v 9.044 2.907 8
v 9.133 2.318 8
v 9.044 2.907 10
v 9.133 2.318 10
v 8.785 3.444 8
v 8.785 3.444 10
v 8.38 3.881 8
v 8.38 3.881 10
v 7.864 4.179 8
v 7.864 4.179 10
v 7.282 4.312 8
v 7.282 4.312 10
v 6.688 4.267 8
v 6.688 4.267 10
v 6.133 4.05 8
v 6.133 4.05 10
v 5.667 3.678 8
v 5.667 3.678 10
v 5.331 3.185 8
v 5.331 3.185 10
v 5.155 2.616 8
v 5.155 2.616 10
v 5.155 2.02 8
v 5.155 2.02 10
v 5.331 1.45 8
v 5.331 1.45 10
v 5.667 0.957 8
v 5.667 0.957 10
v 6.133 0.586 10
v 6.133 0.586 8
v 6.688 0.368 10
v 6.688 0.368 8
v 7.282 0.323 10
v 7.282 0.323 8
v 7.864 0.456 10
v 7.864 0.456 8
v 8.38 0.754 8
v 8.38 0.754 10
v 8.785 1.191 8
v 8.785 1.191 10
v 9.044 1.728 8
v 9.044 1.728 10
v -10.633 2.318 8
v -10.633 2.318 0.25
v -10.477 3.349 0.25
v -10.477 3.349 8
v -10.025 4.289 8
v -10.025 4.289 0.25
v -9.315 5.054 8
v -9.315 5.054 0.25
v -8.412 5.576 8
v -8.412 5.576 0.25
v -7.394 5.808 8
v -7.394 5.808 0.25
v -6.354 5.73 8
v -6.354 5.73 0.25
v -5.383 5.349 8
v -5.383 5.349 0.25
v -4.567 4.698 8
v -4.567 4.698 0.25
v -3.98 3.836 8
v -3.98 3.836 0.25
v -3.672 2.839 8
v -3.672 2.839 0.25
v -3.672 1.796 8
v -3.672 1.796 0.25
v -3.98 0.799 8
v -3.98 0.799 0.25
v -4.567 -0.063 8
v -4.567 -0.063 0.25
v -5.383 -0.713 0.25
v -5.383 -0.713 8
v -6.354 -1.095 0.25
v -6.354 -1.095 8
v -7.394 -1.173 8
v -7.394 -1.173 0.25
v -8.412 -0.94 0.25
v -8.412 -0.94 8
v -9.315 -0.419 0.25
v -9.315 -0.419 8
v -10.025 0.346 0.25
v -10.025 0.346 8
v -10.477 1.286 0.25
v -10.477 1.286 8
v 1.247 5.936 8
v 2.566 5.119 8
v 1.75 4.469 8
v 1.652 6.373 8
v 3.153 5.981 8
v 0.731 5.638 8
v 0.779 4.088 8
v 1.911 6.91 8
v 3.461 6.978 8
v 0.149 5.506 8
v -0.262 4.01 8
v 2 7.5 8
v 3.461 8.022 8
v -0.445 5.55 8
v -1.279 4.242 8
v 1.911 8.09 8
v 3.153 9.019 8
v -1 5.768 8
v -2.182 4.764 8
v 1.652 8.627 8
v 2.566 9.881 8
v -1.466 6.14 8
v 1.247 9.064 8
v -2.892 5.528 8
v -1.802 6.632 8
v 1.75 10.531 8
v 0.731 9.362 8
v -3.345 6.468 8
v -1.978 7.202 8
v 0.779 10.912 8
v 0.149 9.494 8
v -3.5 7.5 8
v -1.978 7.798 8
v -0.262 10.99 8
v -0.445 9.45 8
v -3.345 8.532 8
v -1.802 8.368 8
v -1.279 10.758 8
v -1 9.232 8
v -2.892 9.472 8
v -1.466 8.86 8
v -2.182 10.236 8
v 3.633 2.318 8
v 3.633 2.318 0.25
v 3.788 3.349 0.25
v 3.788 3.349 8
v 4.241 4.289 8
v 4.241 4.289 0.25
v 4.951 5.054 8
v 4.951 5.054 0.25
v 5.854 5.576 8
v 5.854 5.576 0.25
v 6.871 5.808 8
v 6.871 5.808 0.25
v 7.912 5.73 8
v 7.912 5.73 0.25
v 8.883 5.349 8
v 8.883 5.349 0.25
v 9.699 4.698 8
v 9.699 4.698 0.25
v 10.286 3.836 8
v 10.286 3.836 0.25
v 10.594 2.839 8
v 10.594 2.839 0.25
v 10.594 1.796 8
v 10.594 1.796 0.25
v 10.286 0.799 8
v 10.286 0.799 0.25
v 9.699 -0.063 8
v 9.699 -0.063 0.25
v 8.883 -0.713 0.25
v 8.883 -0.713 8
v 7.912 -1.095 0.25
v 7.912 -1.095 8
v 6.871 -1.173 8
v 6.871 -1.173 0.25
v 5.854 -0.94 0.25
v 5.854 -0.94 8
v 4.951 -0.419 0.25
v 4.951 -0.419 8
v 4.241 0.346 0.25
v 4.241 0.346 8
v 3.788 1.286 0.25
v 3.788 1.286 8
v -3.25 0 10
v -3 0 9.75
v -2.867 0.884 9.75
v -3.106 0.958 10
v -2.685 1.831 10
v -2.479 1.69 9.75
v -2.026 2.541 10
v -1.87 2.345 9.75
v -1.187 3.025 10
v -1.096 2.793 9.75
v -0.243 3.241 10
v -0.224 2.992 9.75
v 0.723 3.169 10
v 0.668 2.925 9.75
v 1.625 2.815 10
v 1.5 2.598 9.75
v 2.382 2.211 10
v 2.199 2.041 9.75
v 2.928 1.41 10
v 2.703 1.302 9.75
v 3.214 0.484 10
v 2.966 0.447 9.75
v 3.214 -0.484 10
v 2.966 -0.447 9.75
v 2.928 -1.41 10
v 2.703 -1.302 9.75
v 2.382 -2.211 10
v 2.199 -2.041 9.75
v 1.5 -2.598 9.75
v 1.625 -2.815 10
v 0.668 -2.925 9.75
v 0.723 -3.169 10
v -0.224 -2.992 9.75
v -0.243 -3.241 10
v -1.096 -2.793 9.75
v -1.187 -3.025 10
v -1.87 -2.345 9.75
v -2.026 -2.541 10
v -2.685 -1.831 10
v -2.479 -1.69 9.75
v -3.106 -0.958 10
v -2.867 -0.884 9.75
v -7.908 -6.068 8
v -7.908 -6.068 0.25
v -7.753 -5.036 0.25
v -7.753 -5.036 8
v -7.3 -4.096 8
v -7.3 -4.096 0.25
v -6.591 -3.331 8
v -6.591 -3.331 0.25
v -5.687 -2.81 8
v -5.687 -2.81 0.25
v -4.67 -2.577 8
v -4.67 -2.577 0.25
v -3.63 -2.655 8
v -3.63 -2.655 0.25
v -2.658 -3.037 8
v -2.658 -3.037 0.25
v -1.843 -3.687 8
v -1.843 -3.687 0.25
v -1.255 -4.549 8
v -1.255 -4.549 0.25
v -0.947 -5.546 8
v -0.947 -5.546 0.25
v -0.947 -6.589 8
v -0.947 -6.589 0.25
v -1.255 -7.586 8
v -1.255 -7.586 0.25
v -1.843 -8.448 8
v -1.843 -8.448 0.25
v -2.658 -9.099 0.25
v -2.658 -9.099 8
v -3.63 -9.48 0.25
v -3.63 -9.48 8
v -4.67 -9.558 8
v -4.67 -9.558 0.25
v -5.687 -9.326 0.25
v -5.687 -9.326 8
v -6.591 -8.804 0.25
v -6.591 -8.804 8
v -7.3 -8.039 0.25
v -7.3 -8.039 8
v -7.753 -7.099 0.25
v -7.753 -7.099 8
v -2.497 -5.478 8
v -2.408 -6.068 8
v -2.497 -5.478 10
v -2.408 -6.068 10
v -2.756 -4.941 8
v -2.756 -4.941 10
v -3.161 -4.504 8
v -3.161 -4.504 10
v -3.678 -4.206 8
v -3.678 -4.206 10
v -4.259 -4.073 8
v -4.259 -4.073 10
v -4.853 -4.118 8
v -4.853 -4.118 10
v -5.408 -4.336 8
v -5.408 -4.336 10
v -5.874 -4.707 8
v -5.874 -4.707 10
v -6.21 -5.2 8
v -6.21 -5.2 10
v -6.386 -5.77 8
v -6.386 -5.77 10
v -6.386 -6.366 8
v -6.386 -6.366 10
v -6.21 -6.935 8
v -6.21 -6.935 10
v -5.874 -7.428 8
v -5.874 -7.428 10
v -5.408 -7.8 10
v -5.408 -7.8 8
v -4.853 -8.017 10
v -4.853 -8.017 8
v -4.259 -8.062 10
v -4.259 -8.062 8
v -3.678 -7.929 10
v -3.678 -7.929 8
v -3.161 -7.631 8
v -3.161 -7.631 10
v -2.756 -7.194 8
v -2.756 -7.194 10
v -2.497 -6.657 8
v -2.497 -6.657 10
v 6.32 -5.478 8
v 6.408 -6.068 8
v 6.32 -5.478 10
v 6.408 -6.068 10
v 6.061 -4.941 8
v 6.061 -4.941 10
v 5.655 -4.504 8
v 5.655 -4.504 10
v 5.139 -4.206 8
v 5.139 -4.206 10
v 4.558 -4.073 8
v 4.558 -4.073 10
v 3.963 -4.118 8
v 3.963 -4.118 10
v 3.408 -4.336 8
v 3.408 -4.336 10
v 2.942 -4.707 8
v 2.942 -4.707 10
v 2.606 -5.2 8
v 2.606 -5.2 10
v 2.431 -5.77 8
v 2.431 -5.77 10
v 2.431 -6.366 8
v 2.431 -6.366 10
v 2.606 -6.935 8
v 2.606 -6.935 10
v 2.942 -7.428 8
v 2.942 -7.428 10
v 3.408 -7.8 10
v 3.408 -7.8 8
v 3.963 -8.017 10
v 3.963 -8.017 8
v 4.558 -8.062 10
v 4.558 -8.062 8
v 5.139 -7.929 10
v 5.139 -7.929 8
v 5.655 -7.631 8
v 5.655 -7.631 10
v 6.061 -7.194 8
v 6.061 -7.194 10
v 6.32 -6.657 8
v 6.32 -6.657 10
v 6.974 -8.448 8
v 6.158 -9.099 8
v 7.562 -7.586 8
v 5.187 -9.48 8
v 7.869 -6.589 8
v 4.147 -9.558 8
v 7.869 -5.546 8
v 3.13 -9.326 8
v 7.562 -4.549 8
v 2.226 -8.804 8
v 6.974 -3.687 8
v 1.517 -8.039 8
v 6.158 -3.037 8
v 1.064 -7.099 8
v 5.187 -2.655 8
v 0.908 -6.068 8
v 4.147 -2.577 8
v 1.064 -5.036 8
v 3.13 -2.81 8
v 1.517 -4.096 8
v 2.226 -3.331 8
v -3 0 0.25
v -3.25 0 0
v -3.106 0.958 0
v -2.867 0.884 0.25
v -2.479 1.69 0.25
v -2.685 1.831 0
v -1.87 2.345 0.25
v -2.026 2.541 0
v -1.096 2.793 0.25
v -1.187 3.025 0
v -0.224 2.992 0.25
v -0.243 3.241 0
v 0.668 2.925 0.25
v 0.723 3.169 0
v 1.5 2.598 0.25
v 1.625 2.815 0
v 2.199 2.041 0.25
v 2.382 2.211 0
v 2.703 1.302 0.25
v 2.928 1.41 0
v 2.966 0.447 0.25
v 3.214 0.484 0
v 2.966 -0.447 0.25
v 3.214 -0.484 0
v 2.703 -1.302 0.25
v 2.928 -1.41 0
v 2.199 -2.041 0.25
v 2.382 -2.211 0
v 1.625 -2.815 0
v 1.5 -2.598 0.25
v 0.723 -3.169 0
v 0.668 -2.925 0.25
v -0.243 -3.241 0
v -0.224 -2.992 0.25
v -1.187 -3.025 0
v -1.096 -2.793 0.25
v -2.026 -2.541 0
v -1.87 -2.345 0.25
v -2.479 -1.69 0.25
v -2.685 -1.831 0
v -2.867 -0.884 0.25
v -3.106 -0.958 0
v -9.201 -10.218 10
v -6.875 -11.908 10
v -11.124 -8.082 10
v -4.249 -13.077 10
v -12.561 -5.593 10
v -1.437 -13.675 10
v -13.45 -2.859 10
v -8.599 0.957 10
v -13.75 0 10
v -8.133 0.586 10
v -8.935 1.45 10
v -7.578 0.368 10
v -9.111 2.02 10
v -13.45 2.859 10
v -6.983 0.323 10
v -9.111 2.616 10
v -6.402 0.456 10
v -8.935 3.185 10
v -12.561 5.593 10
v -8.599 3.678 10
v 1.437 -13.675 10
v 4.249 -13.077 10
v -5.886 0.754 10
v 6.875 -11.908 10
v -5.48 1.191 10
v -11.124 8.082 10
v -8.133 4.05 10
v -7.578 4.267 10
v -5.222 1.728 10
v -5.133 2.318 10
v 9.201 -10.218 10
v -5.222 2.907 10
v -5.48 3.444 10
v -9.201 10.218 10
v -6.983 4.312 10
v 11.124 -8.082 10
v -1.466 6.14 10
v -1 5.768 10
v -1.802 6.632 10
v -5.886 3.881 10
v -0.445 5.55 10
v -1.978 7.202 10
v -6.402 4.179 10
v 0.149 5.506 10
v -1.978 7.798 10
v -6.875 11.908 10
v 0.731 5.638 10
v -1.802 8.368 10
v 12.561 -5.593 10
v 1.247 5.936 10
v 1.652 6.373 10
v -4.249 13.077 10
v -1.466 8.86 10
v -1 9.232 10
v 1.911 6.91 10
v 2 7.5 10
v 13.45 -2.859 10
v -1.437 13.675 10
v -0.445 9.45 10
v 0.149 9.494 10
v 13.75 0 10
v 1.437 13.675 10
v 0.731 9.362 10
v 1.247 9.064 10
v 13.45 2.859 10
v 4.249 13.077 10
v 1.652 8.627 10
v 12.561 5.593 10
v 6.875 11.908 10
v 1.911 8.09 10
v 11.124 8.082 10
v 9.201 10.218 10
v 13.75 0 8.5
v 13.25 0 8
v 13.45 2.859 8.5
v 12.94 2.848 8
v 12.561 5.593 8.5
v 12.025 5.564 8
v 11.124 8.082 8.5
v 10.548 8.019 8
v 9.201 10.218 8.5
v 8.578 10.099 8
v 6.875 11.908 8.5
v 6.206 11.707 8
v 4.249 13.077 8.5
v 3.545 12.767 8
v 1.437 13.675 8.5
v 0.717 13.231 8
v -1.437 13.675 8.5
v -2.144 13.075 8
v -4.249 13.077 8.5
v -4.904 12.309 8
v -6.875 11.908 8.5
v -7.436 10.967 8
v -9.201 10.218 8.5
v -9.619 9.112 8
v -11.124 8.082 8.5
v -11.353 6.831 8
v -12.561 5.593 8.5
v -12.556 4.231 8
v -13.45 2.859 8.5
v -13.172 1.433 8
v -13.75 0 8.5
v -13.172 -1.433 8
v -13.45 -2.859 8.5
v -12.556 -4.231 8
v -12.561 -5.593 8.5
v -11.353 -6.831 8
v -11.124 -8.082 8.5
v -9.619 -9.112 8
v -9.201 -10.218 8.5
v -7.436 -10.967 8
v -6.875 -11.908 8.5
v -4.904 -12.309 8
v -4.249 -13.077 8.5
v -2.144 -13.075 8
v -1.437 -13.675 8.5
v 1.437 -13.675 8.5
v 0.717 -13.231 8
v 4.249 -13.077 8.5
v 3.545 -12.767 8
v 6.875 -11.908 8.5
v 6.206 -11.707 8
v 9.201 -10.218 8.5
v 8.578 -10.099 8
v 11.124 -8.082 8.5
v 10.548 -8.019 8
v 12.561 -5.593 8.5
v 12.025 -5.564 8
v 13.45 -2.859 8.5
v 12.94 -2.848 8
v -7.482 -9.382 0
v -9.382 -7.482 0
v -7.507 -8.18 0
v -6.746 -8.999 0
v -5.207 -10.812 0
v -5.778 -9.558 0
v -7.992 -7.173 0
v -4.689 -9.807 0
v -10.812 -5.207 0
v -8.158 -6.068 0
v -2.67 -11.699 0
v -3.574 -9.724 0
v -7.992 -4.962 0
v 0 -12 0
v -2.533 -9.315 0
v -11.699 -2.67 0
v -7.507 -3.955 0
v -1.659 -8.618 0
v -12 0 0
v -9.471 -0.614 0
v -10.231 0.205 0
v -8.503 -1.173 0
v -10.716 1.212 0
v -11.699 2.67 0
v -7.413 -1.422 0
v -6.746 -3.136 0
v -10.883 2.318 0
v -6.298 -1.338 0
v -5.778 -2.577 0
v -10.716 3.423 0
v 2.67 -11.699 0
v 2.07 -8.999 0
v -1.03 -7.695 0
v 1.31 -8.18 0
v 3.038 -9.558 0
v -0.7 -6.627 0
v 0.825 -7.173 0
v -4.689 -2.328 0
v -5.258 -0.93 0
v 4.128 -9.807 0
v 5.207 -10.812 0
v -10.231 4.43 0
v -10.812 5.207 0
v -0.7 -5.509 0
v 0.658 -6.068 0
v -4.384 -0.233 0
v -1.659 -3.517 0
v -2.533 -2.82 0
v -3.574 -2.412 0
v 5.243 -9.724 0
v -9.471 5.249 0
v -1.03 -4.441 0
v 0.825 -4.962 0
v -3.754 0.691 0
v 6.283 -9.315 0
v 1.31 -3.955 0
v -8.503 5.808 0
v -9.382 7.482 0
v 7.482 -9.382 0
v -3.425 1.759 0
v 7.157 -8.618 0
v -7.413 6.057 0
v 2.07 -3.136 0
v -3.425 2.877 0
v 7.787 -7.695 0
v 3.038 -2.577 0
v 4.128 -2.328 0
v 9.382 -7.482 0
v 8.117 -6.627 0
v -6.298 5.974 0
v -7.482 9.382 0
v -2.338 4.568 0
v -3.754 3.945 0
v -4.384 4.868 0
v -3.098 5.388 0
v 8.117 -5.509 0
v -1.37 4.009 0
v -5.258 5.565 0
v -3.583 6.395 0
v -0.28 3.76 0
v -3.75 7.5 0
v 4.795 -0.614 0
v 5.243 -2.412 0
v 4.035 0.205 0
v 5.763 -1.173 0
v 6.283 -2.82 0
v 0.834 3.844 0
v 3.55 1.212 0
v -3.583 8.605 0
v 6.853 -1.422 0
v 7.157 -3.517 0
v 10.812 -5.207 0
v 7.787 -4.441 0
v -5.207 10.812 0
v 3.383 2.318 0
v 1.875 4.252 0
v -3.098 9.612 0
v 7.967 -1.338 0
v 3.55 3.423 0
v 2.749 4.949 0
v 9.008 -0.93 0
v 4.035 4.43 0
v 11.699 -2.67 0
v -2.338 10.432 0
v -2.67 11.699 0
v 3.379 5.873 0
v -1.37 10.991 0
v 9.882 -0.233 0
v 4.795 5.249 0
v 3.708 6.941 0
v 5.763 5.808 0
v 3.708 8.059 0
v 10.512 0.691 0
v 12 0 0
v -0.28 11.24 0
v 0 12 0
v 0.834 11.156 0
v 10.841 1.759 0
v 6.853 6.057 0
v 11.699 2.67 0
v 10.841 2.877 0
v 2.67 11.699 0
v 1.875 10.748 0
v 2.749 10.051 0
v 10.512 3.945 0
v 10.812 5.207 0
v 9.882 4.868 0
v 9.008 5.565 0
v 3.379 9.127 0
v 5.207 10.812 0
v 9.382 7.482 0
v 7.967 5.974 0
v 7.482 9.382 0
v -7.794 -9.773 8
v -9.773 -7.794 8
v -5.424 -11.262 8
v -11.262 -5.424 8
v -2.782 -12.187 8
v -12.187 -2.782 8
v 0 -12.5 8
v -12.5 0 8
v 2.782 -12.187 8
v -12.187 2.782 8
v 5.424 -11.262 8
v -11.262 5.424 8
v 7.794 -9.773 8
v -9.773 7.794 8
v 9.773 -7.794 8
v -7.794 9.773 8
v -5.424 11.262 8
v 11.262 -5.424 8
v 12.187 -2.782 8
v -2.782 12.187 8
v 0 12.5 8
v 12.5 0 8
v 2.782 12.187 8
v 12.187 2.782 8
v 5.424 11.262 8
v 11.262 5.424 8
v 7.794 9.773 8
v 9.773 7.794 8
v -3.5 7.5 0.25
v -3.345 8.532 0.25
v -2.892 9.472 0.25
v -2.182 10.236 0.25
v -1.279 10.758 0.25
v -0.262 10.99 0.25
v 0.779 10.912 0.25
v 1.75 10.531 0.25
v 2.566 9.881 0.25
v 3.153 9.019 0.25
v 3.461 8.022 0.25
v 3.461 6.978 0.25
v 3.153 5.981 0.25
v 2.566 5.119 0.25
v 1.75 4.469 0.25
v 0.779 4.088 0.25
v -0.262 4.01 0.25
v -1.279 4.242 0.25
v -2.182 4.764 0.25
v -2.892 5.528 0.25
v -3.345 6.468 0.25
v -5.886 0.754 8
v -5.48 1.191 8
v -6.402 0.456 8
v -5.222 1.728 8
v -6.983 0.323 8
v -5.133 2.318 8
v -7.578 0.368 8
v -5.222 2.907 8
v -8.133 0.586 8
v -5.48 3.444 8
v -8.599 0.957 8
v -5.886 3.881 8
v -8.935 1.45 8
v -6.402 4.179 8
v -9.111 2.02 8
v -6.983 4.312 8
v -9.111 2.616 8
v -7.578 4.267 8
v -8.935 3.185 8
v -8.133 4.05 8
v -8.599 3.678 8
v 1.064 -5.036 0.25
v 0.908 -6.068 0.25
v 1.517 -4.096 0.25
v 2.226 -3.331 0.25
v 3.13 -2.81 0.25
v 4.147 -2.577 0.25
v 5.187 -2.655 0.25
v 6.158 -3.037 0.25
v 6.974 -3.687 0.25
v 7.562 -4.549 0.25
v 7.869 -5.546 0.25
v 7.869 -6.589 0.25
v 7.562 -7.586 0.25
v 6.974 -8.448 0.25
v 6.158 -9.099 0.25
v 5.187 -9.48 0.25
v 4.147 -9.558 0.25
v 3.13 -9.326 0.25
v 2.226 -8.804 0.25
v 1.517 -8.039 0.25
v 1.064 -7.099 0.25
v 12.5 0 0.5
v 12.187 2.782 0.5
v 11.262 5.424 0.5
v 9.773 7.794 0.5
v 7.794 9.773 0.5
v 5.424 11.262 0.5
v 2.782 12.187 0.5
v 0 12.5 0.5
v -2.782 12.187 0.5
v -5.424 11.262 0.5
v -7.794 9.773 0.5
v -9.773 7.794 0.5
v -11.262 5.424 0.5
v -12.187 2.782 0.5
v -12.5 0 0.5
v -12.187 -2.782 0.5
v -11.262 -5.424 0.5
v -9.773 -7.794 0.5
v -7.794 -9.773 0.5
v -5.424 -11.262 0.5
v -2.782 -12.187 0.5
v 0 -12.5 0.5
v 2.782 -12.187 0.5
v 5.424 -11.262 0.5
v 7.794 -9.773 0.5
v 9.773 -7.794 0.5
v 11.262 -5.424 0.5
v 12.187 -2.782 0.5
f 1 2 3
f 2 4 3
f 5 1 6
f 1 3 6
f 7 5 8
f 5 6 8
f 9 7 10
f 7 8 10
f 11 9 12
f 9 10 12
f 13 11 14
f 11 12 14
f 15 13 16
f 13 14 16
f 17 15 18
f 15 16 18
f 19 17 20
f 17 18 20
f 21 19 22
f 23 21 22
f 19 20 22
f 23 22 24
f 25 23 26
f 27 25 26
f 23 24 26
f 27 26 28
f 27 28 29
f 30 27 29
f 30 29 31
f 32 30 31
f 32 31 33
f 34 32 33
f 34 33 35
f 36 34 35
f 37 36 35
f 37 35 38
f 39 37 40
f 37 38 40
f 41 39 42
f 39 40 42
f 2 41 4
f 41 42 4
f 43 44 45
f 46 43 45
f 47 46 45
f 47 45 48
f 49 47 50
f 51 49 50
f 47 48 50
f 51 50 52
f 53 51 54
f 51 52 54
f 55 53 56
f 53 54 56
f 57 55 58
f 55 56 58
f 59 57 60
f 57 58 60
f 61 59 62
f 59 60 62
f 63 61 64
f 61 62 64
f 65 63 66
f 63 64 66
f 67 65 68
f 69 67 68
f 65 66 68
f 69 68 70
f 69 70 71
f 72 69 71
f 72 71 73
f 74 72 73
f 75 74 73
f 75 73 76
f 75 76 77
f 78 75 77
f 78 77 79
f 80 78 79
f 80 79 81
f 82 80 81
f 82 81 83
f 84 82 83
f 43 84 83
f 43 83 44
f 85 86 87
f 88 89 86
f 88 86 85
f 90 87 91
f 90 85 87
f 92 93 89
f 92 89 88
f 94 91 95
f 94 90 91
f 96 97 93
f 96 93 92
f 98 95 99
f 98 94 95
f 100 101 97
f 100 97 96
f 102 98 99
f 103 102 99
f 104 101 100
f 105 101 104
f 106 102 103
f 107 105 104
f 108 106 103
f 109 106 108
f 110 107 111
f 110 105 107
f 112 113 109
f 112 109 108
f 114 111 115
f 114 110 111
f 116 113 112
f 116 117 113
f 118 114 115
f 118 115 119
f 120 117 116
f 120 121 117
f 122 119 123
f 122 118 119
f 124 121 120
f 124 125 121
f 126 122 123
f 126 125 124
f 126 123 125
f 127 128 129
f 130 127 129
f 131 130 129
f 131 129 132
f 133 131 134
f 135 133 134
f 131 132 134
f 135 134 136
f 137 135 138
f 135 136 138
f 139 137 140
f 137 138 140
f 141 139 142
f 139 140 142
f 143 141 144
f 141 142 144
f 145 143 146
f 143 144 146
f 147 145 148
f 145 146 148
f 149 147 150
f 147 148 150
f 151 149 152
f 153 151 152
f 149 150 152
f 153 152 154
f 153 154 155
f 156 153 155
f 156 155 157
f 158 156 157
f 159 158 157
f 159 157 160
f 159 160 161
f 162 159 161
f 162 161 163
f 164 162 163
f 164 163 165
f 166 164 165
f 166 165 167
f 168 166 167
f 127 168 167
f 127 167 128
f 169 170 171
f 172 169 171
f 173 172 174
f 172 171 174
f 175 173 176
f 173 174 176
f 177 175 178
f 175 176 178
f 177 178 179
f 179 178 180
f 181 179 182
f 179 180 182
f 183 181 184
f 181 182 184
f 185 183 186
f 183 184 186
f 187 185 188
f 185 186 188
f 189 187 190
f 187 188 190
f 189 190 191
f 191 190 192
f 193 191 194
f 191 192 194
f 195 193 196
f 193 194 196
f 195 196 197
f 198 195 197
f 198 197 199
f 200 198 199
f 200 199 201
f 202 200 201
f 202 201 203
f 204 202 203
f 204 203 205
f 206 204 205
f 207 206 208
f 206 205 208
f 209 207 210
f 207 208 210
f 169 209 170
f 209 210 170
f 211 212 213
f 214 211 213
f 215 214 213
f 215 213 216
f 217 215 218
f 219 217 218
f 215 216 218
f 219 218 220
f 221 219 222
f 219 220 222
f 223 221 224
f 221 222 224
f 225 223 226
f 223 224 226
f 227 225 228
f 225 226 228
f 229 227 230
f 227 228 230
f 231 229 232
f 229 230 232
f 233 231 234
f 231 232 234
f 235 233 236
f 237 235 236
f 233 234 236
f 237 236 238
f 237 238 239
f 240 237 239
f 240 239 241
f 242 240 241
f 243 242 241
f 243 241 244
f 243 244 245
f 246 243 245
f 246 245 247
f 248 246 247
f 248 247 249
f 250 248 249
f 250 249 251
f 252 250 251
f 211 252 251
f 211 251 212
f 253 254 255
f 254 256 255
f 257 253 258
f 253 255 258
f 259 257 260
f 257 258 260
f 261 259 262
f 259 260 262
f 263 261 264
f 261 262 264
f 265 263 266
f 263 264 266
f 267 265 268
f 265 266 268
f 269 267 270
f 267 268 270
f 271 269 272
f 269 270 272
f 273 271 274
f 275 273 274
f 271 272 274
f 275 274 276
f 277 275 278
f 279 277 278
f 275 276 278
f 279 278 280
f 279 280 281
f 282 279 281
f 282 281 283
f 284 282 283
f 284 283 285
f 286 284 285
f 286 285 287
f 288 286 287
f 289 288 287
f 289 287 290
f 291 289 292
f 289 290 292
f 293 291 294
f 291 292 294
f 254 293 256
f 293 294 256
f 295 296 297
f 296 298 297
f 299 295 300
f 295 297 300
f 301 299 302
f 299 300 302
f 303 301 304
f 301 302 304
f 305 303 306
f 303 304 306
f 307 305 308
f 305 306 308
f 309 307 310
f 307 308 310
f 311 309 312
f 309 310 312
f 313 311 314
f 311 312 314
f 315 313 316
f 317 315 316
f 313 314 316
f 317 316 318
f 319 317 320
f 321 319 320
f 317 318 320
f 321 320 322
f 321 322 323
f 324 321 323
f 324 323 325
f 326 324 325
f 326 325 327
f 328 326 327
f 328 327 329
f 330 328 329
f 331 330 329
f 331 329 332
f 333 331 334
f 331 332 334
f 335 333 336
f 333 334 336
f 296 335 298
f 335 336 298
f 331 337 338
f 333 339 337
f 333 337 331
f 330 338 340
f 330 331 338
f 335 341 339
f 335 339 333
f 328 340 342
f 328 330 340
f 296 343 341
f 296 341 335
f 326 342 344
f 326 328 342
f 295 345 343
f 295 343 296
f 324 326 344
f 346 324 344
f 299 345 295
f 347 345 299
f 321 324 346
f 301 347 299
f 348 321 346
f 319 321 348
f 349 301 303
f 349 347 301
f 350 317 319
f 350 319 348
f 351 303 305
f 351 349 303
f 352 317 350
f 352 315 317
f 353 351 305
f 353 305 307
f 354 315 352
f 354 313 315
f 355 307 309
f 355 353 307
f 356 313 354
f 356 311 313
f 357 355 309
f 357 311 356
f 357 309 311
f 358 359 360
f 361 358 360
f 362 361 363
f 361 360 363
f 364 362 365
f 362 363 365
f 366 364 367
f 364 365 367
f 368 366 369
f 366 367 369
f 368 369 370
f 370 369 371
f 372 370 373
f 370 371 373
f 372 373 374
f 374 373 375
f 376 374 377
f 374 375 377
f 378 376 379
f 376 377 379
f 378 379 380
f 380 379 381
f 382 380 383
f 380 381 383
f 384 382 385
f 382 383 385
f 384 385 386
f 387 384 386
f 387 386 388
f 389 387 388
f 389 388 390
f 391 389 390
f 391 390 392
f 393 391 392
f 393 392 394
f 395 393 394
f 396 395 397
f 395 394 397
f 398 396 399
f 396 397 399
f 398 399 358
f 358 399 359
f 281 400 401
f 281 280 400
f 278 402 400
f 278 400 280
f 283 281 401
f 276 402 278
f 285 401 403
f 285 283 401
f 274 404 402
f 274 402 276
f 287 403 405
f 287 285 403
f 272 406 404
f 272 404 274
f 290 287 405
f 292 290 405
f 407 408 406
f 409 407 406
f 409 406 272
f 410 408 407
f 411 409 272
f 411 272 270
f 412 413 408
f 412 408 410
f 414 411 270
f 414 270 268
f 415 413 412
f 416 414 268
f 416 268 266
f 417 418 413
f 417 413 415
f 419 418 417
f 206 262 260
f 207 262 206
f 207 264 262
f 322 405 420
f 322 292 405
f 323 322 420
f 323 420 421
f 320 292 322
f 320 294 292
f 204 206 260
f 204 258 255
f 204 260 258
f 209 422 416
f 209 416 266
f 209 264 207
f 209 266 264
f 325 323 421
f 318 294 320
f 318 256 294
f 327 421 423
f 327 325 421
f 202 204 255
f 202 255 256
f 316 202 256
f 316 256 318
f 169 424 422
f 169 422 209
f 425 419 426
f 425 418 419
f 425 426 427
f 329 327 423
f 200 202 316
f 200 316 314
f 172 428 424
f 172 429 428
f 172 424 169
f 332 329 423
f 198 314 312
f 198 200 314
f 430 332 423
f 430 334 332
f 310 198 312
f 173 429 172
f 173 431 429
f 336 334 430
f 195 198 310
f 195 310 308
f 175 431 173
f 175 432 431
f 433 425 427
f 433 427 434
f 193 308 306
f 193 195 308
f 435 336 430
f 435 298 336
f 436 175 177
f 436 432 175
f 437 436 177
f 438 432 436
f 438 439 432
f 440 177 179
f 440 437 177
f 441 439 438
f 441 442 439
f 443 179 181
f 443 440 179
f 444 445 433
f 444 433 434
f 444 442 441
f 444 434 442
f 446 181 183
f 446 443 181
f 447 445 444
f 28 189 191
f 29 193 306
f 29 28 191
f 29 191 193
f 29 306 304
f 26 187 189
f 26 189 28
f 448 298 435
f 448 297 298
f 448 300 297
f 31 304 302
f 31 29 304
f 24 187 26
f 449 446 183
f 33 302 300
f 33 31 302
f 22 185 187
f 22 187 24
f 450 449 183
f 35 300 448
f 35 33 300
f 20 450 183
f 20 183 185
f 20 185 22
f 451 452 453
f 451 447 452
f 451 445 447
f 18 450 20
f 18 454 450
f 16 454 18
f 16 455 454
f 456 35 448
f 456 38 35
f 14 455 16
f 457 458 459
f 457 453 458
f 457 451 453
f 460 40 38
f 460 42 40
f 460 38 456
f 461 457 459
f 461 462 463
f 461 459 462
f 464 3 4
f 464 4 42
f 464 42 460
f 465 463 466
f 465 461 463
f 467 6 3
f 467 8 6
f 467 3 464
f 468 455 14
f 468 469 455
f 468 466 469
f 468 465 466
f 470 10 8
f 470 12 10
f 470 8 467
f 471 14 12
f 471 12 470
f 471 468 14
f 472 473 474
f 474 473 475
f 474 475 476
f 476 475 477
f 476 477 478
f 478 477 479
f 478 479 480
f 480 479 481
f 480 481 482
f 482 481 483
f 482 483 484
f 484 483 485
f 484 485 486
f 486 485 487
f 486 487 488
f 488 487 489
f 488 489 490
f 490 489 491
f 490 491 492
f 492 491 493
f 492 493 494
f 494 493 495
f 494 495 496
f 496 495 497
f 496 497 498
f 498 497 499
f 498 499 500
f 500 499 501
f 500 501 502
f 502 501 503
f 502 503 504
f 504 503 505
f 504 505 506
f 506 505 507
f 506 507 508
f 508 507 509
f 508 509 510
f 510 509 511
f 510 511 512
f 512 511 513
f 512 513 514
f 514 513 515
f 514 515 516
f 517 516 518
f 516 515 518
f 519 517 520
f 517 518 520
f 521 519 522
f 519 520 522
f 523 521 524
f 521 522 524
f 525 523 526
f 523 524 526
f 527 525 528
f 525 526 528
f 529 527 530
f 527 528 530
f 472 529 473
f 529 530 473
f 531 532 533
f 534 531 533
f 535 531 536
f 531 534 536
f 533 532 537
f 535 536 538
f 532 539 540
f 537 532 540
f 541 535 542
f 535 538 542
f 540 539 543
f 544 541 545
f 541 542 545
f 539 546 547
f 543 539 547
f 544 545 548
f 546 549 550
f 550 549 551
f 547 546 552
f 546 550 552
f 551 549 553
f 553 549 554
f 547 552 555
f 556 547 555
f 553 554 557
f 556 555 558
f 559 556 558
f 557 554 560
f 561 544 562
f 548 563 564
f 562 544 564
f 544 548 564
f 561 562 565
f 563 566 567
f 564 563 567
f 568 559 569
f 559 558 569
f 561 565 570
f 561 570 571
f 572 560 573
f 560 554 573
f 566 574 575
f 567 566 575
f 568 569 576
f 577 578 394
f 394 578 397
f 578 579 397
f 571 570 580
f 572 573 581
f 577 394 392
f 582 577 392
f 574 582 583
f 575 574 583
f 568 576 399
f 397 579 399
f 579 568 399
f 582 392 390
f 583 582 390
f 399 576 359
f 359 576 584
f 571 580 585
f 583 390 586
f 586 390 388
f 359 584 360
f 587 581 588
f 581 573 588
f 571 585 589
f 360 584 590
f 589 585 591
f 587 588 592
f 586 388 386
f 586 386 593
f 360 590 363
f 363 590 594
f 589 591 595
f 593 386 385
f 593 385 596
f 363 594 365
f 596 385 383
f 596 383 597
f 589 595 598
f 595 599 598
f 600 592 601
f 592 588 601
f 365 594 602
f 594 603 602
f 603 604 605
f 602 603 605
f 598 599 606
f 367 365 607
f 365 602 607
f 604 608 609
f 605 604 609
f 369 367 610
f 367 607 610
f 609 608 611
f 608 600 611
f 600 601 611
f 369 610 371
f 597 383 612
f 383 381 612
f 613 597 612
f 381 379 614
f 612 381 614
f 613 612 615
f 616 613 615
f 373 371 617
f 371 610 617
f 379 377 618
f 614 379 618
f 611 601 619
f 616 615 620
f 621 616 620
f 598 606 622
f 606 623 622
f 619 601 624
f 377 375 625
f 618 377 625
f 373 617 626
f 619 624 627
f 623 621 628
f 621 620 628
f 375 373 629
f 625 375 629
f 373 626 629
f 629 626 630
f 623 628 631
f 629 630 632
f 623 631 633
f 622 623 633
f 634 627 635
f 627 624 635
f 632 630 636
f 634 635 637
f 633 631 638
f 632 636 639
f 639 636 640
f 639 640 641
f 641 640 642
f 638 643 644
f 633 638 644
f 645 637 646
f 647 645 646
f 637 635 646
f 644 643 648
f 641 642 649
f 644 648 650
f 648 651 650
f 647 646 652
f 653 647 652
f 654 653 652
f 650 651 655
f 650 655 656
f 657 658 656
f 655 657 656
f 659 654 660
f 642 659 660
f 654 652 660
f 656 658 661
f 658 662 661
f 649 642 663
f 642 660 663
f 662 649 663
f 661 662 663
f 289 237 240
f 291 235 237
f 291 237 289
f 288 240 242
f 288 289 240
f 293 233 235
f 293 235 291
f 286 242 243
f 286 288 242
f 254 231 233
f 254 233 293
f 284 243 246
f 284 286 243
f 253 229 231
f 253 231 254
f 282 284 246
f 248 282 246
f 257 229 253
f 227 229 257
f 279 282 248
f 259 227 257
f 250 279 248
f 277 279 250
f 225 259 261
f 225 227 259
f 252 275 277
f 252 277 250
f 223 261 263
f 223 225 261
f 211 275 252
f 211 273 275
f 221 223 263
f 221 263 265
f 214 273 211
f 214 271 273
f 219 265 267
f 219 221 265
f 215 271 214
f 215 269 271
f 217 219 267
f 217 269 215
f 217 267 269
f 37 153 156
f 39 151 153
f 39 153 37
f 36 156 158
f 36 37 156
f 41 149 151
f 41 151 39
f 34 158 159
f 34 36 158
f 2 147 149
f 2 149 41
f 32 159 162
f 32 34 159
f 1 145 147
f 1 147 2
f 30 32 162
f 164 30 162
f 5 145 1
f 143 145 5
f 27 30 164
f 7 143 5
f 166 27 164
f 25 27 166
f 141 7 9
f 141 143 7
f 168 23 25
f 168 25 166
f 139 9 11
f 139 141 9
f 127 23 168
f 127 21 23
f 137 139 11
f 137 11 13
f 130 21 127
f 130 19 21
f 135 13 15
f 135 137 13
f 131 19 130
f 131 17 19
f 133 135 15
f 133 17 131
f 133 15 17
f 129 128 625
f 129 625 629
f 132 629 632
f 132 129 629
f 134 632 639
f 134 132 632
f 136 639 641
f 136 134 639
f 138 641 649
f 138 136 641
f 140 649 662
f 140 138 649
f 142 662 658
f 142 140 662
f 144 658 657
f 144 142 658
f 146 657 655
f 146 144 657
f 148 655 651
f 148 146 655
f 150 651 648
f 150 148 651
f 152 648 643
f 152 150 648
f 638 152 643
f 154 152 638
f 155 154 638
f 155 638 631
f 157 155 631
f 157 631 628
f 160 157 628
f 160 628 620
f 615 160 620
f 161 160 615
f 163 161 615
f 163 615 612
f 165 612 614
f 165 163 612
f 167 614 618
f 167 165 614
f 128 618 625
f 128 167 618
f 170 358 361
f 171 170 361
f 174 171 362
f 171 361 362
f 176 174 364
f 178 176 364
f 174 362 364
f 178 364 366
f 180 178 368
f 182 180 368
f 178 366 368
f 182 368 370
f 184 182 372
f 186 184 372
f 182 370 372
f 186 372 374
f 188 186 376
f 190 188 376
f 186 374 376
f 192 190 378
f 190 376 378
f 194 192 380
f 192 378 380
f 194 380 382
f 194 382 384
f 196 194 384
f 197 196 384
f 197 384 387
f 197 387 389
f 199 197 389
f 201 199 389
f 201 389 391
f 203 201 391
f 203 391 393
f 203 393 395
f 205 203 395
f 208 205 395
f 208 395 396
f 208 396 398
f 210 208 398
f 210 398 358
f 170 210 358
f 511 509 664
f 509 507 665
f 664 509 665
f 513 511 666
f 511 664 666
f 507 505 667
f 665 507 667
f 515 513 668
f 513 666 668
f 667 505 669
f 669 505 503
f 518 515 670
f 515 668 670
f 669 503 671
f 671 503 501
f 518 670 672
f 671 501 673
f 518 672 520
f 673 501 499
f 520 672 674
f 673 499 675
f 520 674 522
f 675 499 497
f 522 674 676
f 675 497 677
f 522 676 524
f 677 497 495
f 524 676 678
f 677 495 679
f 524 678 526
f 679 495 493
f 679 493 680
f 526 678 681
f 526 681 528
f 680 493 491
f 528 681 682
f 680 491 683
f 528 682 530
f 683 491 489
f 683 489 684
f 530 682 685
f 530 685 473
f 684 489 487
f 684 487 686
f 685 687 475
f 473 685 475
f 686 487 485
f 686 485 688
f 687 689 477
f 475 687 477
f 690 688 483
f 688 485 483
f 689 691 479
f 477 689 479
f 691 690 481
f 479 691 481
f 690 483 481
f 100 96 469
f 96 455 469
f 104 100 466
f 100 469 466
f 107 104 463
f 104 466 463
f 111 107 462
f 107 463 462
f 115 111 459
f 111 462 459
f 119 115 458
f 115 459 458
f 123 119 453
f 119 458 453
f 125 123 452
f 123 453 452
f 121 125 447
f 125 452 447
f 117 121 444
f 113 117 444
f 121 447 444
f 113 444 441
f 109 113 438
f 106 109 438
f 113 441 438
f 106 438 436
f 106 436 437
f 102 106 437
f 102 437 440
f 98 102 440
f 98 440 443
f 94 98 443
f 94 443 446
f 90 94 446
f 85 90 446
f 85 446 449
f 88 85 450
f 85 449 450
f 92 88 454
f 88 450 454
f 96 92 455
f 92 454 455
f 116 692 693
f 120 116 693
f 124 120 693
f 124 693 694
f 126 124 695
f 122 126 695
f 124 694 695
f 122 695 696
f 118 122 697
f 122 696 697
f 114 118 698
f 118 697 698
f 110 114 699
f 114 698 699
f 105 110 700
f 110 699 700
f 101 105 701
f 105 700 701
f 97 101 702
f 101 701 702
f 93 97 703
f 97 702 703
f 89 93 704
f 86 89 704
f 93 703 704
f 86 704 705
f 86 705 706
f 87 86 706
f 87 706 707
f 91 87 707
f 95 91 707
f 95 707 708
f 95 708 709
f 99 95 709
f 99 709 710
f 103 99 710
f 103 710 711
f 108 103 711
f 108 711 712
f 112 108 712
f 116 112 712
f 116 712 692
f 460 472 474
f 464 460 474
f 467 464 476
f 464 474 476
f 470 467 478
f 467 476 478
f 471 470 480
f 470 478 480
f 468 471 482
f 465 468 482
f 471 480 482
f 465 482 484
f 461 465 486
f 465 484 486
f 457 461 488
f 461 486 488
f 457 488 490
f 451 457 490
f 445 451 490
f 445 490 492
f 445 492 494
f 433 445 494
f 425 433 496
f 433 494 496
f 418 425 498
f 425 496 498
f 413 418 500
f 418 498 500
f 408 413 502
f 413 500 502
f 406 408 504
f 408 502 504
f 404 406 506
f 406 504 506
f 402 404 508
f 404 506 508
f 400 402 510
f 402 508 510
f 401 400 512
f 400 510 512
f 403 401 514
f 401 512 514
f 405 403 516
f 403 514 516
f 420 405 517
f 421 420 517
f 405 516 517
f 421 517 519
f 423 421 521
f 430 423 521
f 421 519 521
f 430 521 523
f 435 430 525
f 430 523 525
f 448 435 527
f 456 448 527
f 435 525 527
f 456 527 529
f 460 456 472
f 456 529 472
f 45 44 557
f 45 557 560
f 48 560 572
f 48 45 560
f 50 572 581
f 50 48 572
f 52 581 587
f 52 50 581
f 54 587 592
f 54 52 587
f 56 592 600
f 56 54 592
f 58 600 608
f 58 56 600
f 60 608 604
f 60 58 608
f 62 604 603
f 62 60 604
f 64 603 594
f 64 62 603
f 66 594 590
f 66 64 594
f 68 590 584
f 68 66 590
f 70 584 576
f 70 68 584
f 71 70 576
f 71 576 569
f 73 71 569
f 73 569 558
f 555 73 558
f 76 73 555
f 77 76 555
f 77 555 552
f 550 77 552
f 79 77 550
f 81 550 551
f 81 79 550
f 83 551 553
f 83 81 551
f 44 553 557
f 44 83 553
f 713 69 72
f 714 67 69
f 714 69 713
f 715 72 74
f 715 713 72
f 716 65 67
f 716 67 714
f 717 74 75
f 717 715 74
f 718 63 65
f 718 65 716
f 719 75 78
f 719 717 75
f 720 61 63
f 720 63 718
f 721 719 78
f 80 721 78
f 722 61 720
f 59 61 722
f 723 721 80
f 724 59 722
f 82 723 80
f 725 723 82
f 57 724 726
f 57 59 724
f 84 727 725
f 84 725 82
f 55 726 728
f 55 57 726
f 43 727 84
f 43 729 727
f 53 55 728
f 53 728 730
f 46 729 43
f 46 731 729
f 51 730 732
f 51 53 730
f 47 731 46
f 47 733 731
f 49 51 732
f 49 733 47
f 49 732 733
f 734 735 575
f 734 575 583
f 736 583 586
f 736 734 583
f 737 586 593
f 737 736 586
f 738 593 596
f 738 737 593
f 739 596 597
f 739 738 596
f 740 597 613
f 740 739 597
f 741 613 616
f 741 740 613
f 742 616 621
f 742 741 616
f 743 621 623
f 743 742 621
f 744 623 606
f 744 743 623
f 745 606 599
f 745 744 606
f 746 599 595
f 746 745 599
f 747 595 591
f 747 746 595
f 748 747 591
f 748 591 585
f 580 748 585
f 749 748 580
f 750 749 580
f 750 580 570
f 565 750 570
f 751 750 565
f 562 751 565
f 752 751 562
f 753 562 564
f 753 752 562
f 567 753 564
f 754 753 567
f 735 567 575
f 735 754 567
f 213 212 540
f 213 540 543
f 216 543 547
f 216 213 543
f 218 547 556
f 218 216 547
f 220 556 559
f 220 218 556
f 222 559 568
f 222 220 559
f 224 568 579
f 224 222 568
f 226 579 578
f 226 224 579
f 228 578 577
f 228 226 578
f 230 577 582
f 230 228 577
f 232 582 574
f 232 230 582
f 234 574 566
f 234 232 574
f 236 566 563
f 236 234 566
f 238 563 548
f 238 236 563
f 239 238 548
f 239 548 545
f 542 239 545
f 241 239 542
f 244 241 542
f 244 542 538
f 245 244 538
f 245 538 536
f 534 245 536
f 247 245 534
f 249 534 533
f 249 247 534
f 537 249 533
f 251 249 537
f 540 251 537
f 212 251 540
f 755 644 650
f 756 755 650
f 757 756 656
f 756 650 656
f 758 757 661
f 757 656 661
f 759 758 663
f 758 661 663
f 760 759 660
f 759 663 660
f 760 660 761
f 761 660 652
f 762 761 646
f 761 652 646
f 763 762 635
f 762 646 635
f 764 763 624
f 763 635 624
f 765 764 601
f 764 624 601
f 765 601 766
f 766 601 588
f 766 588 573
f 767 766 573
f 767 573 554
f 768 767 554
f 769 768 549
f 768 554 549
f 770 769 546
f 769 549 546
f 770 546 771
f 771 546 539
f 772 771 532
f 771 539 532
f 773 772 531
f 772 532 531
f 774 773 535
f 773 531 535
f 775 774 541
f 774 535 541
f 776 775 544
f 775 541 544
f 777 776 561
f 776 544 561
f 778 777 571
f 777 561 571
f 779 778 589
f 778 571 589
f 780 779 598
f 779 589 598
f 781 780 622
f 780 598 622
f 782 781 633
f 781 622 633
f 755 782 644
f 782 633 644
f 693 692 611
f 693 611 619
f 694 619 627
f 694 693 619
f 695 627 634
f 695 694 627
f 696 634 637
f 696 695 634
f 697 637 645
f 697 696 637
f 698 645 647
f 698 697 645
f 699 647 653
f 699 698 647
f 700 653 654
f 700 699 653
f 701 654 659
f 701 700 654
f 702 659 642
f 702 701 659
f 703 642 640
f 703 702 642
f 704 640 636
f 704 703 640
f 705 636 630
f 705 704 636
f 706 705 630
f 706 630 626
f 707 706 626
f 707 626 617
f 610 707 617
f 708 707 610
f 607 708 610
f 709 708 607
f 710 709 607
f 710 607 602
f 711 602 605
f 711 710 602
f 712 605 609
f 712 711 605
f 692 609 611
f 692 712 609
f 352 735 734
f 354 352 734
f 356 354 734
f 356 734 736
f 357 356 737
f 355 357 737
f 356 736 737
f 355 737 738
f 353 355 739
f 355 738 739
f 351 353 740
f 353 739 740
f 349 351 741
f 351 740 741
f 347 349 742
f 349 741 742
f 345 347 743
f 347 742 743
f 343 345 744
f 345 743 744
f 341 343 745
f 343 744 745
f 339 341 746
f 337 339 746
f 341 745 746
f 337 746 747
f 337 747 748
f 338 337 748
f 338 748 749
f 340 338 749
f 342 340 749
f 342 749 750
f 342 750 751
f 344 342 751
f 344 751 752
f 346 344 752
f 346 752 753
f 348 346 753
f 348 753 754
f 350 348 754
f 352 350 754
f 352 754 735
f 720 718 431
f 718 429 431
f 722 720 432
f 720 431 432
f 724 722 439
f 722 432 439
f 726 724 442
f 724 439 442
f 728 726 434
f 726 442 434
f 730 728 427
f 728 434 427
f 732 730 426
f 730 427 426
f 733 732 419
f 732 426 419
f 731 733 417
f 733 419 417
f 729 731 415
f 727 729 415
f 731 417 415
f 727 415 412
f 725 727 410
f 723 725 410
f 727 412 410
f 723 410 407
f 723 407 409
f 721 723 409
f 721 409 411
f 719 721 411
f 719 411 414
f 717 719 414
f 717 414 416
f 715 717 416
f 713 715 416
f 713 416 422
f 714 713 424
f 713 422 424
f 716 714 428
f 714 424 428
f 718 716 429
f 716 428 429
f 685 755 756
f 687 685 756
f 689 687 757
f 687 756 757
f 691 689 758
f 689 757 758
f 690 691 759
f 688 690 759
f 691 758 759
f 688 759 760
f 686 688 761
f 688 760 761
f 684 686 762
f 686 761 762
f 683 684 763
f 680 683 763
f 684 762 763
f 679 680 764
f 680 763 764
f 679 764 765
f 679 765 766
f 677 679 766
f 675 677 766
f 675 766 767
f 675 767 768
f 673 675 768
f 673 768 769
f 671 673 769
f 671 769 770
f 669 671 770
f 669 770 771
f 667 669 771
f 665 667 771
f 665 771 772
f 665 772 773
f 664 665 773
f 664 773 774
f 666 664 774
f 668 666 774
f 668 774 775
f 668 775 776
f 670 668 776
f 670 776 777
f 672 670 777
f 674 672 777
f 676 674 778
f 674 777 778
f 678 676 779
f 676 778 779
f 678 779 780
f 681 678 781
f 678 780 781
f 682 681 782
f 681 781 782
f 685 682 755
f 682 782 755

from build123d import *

# Parameters (mm, degrees)
SKETCH_1_R                   = 12.5
SKETCH_1_R_2                 = 1.5
EXTRUDE_1_DEPTH              = 10
EXTRUDE_START                = -2
SKETCH_3_R                   = 13.75
SKETCH_3_R_2                 = 12.5
EXTRUDE_3_DEPTH              = 2
SKETCH_4_R                   = 3
CUT_EXTRUDE_1_DEPTH          = 22.866069606
HOLE_WIZARD_M3_1_D           = 4
HOLE_WIZARD_M3_1_CBORE_D     = 7
HOLE_WIZARD_M3_1_CBORE_DEPTH = 8
CHAMFER_1_SIZE               = 0.5
CHAMFER_2_SIZE               = 0.25


with BuildPart() as part:
    # ｽｹｯﾁ1 → ﾎﾞｽ - 押し出し1 (new body)
    with BuildSketch(Plane.XY):
        Circle(SKETCH_1_R)
        with Locations((0, 7.5)):
            Circle(SKETCH_1_R_2, mode=Mode.SUBTRACT)
        with Locations((7.132923872, 2.317627458)):
            Circle(SKETCH_1_R_2, mode=Mode.SUBTRACT)
        with Locations((4.408389392, -6.067627458)):
            Circle(SKETCH_1_R_2, mode=Mode.SUBTRACT)
        with Locations((-4.408389392, -6.067627458)):
            Circle(SKETCH_1_R_2, mode=Mode.SUBTRACT)
        with Locations((-7.132923872, 2.317627458)):
            Circle(SKETCH_1_R_2, mode=Mode.SUBTRACT)
    extrude(amount=EXTRUDE_1_DEPTH)

    # ｽｹｯﾁ3 → ﾎﾞｽ - 押し出し3 (add)
    with BuildSketch(Plane.XY.offset(10).offset(EXTRUDE_START)):
        Circle(SKETCH_3_R)
        Circle(SKETCH_3_R_2, mode=Mode.SUBTRACT)
    extrude(amount=EXTRUDE_3_DEPTH)

    # ｽｹｯﾁ4 → ｶｯﾄ - 押し出し1 (cut, through all)
    with BuildSketch(Plane(origin=(0, 0, 0), x_dir=(-1, 0, 0), z_dir=(0, 0, -1))):
        Circle(SKETCH_4_R)
    extrude(amount=-CUT_EXTRUDE_1_DEPTH, mode=Mode.SUBTRACT)

    # M3 穴付きねじ用座ぐり穴1 (through all)
    with Locations(Plane(origin=(0, 0, 0), x_dir=(-1, 0, 0), z_dir=(0, 0, -1))):
        with Locations((0, 7.5), (7.132923872, 2.317627458), (4.408389392, -6.067627458), (-4.408389392, -6.067627458), (-7.132923872, 2.317627458)):
            CounterBoreHole(HOLE_WIZARD_M3_1_D / 2, HOLE_WIZARD_M3_1_CBORE_D / 2, HOLE_WIZARD_M3_1_CBORE_DEPTH)

    # 面取り1
    chamfer_1_edges = [part.edges().sort_by_distance(p)[0] for p in [
        (-12.5, 0, 0),
        (-13.75, 0, 8),
    ]]
    chamfer(chamfer_1_edges, length=CHAMFER_1_SIZE)

    # 面取り2
    chamfer_2_edges = [part.edges().sort_by_distance(p)[0] for p in [
        (3, 0, 10),
        (3, 0, 0),
        (10.632923872, 2.317627458, 0),
        (7.908389392, -6.067627458, 0),
        (-0.908389392, -6.067627458, 0),
        (-3.632923872, 2.317627458, 0),
        (3.5, 7.5, 0),
    ]]
    chamfer(chamfer_2_edges, length=CHAMFER_2_SIZE)


solid = part.part
